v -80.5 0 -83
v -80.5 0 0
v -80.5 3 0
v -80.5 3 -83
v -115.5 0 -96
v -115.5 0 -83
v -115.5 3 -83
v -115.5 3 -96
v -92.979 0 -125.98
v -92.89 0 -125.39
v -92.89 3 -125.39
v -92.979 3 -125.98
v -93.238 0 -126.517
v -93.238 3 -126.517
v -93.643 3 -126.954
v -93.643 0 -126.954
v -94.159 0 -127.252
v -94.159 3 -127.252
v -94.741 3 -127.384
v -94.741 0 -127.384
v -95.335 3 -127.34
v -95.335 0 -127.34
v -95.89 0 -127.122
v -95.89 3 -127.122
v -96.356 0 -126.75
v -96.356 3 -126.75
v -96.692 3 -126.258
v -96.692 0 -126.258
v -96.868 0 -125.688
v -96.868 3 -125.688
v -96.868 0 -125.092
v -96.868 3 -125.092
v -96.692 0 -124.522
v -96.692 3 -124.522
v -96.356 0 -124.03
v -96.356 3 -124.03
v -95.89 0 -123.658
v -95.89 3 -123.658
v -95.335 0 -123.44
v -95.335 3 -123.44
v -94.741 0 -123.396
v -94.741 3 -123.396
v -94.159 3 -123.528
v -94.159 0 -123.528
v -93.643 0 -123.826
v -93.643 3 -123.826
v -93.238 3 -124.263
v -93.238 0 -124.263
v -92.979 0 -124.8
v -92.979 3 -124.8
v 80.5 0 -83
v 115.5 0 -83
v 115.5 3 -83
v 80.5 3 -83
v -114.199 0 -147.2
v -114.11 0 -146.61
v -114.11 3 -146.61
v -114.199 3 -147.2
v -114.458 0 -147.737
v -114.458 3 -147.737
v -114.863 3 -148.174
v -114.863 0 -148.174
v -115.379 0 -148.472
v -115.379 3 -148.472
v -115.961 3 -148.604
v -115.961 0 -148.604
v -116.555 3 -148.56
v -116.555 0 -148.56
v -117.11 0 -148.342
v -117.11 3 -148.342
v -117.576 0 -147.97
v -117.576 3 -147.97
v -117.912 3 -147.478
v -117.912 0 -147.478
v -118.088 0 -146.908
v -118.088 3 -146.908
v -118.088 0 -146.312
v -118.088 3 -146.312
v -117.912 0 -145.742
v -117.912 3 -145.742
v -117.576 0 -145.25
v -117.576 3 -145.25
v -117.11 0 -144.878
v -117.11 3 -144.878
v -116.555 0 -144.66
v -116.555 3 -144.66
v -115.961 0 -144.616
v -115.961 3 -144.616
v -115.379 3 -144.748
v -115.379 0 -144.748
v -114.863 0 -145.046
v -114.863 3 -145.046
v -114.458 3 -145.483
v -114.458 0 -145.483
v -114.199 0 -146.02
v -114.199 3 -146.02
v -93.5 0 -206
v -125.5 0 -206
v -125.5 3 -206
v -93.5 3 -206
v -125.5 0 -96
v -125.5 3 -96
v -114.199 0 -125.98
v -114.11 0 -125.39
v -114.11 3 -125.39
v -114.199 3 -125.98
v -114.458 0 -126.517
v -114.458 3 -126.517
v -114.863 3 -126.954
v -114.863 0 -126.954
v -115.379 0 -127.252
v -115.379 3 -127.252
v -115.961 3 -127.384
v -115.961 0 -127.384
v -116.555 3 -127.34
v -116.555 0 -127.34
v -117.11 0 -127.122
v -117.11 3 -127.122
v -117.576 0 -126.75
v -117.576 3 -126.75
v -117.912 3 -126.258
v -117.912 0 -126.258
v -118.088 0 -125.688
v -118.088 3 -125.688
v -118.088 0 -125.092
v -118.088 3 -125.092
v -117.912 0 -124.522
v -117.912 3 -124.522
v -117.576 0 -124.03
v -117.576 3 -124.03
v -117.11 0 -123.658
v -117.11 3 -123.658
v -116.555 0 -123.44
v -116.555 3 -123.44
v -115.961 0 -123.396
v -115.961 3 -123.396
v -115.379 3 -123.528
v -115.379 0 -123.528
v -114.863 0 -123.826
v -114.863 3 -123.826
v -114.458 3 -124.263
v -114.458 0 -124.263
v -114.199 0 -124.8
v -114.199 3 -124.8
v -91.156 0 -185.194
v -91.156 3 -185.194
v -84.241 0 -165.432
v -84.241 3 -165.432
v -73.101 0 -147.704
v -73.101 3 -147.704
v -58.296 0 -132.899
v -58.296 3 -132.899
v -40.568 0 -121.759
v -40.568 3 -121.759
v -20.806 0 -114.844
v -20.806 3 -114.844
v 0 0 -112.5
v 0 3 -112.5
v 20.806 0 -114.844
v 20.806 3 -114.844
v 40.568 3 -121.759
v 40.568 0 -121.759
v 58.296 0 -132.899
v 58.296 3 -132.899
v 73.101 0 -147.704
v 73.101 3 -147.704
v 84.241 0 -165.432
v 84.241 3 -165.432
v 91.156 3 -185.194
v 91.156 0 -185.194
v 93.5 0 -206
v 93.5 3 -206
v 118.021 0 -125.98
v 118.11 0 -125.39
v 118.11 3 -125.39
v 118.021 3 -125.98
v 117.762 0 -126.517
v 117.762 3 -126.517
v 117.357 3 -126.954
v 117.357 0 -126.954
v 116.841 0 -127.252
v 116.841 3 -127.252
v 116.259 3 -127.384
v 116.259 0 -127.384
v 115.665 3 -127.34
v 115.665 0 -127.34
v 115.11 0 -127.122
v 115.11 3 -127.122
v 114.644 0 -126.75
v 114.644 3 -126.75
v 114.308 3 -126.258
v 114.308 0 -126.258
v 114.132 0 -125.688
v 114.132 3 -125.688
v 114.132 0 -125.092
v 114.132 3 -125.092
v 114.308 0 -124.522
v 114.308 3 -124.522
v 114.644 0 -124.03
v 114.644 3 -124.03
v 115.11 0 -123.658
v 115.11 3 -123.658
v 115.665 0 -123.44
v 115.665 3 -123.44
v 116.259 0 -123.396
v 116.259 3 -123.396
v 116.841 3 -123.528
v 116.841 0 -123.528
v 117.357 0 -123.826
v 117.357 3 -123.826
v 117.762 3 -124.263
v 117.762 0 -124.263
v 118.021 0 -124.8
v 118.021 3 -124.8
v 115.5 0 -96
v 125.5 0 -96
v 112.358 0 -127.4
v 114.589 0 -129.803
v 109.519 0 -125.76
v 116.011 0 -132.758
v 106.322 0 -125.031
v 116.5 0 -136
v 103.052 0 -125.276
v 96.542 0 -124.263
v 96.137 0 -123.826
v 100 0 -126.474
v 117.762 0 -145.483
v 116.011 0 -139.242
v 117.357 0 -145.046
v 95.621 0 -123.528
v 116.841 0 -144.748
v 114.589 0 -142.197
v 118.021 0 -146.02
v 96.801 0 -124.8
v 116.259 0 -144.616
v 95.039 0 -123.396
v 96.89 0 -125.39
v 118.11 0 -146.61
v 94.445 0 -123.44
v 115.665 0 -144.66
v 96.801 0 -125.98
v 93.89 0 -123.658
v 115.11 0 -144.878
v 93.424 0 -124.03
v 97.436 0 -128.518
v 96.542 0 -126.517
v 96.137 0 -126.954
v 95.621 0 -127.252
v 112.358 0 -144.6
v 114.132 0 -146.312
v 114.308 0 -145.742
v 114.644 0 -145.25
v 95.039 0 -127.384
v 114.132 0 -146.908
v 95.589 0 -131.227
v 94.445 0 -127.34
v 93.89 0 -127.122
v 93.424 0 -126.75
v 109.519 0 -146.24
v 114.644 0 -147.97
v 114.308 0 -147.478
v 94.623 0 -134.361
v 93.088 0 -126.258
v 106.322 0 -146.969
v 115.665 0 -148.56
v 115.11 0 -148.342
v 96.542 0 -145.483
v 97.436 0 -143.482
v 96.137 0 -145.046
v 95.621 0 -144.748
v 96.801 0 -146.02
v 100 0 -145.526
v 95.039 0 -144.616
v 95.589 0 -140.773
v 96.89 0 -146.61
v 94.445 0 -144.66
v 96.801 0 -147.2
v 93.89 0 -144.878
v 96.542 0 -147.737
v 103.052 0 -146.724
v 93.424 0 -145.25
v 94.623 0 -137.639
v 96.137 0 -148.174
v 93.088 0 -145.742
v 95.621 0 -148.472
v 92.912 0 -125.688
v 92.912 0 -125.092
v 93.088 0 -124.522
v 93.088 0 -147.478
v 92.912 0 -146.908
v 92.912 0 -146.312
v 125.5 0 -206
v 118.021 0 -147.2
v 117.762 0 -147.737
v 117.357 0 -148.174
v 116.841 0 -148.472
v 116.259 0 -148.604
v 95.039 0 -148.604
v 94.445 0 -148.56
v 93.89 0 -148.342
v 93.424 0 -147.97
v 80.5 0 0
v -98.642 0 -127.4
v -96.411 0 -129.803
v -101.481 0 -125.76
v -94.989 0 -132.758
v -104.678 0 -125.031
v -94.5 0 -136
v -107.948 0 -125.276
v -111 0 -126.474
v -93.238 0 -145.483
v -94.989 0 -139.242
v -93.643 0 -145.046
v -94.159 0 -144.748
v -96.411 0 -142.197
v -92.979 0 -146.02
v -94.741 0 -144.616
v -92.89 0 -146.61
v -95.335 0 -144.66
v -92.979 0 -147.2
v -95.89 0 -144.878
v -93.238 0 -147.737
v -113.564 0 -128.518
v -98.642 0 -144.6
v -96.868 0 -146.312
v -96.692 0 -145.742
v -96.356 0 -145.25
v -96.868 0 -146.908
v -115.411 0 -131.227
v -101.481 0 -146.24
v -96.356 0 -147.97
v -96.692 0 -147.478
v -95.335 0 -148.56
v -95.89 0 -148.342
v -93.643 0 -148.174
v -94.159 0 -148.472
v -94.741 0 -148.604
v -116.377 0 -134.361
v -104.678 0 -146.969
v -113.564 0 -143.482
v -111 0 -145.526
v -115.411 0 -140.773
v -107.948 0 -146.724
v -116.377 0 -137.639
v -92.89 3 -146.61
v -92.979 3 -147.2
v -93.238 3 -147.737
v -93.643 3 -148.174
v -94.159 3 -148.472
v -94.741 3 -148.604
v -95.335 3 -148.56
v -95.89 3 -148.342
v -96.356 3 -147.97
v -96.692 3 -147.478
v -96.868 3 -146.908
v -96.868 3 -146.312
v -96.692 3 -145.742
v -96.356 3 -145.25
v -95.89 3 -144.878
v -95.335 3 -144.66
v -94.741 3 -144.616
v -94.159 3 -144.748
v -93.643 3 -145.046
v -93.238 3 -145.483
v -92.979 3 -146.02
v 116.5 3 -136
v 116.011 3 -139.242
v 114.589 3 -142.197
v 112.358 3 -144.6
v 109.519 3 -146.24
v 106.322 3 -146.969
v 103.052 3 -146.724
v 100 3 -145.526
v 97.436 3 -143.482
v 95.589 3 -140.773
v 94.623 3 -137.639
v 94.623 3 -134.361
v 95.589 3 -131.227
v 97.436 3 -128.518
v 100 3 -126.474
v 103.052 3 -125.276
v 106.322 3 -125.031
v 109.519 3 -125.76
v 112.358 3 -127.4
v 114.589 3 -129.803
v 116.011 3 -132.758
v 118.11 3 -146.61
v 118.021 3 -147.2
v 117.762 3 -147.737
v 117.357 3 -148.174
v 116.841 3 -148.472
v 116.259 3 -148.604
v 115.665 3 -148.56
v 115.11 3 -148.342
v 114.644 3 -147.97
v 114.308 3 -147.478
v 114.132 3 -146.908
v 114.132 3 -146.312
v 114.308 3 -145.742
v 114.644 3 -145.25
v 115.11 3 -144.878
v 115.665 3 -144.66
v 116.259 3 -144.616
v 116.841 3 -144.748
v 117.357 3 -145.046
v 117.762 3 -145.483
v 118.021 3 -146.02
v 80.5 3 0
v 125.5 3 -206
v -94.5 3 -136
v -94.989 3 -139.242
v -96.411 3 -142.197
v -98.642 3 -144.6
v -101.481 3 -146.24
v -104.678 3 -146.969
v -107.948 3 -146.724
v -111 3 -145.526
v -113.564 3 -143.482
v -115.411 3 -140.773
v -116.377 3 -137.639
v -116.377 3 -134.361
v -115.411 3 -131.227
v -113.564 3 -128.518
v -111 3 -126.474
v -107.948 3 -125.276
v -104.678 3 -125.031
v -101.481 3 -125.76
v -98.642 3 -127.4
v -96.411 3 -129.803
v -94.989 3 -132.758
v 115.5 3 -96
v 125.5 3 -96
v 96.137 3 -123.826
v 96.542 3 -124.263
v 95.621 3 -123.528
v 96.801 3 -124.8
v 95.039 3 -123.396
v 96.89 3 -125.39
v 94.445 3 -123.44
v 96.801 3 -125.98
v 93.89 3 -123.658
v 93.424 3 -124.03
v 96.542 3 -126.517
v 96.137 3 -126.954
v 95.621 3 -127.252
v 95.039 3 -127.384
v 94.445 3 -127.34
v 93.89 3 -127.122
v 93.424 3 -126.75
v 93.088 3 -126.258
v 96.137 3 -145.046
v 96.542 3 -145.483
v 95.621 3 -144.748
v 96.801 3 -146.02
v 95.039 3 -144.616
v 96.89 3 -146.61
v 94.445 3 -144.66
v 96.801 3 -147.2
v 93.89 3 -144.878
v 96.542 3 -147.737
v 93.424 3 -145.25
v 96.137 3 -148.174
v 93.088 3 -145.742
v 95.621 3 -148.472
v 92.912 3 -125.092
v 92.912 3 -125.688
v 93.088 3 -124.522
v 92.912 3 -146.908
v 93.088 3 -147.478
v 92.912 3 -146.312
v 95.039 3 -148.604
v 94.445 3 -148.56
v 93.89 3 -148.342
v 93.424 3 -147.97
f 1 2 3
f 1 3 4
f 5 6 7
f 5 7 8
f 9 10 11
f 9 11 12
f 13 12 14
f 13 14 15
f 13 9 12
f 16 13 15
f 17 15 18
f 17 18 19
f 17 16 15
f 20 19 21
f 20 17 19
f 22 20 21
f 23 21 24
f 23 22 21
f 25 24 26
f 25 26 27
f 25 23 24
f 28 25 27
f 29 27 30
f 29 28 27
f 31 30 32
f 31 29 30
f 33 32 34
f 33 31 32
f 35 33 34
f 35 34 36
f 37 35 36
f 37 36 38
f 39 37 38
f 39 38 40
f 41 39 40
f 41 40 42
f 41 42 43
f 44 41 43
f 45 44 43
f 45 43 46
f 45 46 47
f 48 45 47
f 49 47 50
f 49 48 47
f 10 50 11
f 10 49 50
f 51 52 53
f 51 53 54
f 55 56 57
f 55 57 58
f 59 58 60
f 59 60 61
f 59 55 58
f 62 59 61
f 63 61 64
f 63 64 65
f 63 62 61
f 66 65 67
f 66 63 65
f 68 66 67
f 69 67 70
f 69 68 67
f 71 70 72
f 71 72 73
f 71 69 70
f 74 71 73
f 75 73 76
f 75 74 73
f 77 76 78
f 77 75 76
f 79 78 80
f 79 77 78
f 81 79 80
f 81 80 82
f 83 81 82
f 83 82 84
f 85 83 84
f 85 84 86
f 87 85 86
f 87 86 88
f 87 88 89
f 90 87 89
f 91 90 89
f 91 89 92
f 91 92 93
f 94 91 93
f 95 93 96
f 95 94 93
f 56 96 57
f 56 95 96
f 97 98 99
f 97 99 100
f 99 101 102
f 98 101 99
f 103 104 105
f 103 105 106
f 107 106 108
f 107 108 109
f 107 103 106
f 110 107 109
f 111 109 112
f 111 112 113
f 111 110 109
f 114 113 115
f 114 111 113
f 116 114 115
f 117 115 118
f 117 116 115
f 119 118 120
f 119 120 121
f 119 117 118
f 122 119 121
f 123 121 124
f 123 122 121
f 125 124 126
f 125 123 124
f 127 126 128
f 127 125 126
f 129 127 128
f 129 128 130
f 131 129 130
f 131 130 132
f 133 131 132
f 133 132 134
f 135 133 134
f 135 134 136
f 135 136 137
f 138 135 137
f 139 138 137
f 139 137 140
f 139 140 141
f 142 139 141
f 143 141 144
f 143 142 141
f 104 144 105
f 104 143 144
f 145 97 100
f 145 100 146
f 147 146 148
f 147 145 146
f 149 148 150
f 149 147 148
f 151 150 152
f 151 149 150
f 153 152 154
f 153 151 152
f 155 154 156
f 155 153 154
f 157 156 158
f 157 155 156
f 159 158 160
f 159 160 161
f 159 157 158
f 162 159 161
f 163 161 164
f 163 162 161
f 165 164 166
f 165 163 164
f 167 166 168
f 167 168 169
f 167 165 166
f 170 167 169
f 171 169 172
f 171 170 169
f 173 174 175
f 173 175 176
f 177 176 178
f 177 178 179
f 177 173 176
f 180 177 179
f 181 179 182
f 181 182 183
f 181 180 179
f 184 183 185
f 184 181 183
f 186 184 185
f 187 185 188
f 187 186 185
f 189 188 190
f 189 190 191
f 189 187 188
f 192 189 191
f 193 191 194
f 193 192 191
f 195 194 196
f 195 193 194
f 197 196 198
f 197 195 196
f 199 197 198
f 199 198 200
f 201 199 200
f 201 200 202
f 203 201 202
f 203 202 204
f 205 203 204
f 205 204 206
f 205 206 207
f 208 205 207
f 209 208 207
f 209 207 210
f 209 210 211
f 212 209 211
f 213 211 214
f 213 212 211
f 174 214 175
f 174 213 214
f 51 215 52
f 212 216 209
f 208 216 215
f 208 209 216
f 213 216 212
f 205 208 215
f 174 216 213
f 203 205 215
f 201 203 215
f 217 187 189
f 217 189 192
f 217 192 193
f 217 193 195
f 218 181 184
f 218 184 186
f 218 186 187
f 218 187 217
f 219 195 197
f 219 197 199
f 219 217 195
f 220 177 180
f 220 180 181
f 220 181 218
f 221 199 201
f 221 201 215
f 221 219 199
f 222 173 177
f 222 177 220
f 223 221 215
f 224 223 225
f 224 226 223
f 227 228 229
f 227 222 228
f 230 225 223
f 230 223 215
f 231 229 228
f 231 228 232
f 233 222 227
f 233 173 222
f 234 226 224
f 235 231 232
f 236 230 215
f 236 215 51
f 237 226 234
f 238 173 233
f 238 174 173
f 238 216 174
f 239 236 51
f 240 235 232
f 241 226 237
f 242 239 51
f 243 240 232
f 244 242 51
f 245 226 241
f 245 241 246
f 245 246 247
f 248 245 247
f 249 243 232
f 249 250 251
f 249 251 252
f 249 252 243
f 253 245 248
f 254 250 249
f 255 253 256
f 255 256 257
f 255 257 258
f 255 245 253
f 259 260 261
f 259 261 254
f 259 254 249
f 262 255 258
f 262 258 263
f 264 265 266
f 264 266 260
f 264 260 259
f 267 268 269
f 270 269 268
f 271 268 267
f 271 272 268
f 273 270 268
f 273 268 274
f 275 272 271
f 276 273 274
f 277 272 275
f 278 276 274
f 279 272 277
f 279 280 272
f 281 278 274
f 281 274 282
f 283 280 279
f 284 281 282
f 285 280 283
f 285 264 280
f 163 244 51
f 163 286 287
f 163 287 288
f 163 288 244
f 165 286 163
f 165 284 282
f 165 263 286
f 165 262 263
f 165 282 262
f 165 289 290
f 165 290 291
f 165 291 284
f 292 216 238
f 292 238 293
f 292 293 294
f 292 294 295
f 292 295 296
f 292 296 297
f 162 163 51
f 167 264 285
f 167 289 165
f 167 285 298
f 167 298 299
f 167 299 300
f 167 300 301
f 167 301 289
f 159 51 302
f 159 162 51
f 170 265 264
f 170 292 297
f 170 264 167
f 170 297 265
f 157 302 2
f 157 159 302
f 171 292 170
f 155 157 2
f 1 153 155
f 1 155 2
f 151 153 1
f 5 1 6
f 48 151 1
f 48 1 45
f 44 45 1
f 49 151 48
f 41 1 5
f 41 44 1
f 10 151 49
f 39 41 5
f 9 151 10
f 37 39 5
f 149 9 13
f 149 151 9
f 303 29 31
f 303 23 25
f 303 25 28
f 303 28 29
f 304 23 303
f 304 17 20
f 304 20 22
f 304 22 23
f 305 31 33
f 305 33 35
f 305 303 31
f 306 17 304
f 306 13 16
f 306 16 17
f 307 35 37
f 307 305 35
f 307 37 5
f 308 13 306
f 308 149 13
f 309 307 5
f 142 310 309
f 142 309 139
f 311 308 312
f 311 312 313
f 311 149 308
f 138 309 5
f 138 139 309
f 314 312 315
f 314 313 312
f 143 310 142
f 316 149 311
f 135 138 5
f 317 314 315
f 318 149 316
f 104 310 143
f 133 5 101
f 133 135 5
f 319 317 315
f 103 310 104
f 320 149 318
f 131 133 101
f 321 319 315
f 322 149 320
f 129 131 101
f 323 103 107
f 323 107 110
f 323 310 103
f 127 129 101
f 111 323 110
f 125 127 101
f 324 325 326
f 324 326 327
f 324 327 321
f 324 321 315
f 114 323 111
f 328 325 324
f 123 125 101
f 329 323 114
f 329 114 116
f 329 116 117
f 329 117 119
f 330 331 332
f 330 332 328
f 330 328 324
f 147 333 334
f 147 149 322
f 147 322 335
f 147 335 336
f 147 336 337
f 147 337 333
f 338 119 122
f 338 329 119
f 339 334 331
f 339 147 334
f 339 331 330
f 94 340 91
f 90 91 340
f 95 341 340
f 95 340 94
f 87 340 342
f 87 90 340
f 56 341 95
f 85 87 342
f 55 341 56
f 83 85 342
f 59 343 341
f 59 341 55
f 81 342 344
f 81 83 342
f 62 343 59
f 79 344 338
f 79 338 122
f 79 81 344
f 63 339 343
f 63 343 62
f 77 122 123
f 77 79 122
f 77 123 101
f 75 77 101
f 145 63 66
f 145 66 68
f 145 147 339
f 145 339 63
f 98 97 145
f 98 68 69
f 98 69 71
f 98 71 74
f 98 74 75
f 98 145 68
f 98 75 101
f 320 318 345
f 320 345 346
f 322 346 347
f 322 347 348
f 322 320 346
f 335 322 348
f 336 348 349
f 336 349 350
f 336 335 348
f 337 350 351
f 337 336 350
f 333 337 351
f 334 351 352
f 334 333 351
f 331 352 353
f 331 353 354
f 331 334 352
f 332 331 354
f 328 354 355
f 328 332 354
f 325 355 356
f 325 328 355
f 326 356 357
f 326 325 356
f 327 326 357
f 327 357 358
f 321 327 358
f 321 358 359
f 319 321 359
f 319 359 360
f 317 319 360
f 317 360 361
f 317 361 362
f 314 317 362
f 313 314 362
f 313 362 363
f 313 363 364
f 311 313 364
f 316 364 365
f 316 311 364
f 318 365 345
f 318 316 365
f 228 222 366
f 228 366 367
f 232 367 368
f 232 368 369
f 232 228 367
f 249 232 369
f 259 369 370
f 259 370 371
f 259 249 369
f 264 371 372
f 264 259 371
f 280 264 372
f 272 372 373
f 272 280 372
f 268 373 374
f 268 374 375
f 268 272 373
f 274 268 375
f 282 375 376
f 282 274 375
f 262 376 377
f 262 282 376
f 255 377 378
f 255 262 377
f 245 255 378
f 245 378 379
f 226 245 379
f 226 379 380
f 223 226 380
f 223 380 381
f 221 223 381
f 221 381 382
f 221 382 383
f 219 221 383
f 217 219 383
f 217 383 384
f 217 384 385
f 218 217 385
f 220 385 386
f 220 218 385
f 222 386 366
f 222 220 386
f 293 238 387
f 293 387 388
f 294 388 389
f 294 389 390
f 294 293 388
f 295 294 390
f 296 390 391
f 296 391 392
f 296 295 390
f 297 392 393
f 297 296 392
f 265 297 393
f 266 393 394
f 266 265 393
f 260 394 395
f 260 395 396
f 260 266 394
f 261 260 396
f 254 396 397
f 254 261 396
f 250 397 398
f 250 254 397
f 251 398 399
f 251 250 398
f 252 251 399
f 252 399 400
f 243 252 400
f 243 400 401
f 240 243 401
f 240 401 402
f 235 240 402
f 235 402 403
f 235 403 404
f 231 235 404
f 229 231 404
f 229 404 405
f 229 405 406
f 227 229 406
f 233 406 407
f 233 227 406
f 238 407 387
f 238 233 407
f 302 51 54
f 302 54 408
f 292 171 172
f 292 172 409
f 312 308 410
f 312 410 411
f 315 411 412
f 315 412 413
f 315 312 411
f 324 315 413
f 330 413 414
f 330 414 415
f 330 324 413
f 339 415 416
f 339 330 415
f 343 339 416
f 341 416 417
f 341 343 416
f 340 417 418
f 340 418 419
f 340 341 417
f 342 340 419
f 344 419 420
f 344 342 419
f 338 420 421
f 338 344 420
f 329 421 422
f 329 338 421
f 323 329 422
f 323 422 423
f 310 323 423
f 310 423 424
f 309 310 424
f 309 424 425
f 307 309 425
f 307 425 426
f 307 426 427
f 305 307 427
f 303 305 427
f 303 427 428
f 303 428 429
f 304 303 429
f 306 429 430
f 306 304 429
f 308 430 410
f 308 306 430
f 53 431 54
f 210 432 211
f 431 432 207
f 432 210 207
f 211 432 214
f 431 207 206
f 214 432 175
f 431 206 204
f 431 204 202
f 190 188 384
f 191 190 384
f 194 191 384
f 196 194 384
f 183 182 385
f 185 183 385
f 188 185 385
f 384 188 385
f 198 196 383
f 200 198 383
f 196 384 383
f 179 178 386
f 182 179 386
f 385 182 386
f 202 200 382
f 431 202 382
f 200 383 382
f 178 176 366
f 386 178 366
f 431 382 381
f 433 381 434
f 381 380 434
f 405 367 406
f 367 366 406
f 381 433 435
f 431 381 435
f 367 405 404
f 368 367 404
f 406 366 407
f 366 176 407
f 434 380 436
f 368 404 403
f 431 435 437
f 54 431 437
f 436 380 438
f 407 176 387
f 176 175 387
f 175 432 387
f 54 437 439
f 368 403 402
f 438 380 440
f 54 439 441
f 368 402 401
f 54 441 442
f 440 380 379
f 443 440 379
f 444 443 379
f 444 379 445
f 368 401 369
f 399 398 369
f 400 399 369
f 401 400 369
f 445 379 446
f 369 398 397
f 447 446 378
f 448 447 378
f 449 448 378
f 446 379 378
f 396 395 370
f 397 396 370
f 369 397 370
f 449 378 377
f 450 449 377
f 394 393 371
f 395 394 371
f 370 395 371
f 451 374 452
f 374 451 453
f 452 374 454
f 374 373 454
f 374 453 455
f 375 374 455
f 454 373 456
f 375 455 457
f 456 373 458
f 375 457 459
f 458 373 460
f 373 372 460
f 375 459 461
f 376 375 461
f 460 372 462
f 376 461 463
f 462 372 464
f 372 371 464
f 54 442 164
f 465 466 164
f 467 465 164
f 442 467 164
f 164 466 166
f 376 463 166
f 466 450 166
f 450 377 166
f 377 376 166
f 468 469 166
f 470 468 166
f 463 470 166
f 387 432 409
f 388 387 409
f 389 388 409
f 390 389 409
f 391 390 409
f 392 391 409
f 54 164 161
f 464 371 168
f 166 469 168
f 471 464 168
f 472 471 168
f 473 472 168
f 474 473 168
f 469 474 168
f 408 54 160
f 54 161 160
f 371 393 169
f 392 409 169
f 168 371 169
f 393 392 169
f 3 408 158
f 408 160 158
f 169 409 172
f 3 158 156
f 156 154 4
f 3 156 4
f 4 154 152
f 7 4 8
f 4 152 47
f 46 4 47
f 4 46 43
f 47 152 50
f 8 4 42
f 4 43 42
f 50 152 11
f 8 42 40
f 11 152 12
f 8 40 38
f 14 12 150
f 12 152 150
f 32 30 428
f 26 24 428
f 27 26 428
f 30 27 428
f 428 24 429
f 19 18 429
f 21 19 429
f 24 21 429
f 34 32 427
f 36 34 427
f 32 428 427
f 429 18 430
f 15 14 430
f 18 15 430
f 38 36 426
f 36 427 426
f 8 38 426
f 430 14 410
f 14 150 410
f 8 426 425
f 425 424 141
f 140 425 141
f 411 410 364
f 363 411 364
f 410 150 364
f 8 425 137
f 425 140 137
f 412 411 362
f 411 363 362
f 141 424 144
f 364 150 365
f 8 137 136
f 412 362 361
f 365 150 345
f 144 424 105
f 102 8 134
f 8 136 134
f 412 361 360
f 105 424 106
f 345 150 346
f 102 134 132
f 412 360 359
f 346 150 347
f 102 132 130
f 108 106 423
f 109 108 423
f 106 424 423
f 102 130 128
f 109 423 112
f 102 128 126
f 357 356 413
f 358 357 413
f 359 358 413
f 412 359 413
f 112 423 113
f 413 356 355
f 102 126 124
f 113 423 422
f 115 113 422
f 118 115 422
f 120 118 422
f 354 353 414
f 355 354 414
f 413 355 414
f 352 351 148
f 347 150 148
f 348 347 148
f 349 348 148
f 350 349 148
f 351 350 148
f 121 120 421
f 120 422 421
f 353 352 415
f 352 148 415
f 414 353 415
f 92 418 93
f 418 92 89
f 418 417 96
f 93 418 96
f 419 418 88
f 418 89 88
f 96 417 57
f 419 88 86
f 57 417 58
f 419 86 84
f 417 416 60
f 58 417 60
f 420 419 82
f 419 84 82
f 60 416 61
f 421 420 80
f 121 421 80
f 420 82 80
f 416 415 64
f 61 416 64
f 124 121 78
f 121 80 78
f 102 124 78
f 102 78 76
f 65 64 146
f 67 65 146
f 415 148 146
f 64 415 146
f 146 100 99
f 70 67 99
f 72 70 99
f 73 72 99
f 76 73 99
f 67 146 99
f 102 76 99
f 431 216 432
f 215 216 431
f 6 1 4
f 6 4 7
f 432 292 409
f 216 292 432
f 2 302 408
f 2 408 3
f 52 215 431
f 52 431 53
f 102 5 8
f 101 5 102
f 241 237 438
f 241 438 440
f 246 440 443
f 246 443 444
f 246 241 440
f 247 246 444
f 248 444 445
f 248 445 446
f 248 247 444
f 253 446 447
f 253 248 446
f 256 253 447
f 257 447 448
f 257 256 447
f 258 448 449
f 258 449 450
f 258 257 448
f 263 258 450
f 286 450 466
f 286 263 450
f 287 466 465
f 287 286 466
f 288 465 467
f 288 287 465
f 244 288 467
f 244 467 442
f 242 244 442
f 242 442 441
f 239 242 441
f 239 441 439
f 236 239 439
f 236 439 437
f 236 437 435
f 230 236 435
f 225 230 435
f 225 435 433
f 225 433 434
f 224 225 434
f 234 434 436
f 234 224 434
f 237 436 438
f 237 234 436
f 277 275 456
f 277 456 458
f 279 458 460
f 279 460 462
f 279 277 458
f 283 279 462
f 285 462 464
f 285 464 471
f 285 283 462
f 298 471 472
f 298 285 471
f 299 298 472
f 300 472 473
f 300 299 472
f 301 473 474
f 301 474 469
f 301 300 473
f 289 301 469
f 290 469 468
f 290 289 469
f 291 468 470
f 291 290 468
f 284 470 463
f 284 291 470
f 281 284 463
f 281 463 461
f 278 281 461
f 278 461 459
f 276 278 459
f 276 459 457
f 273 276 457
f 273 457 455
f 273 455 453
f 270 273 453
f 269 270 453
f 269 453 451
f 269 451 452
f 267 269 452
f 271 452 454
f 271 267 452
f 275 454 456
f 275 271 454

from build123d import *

# Parameters (mm, degrees)
ESQUISSE1_R      = 2
ESQUISSE1_R_2    = 11
EXTRUSION1_DEPTH = 3


with BuildPart() as part:
    # Esquisse1 → Extrusion1 (new body)
    with BuildSketch(Plane(origin=(0, 0, 0), x_dir=(1, 0, 0), z_dir=(0, 1, 0))):
        with BuildLine():
            Line((80.5, 0), (-80.5, 0))
            Line((-80.5, 0), (-80.5, 83))
            Line((-80.5, 83), (-115.5, 83))
            Line((-115.5, 83), (-115.5, 96))
            Line((-115.5, 96), (-125.5, 96))
            Line((-125.5, 96), (-125.5, 206))
            Line((-125.5, 206), (-93.5, 206))
            ThreePointArc((-93.5, 206), (0, 112.5), (93.5, 206))
            Line((93.5, 206), (125.5, 206))
            Line((125.5, 206), (125.5, 96))
            Line((125.5, 96), (115.5, 96))
            Line((115.5, 96), (115.5, 83))
            Line((115.5, 83), (80.5, 83))
            Line((80.5, 83), (80.5, 0))
        make_face()
        with Locations((94.89, 146.61)):
            Circle(ESQUISSE1_R, mode=Mode.SUBTRACT)
        with Locations((-105.5, 136)):
            Circle(ESQUISSE1_R_2, mode=Mode.SUBTRACT)
        with Locations((-116.11, 146.61)):
            Circle(ESQUISSE1_R, mode=Mode.SUBTRACT)
        with Locations((-116.11, 125.39)):
            Circle(ESQUISSE1_R, mode=Mode.SUBTRACT)
        with Locations((-94.89, 125.39)):
            Circle(ESQUISSE1_R, mode=Mode.SUBTRACT)
        with Locations((-94.89, 146.61)):
            Circle(ESQUISSE1_R, mode=Mode.SUBTRACT)
        with Locations((94.89, 125.39)):
            Circle(ESQUISSE1_R, mode=Mode.SUBTRACT)
        with Locations((116.11, 125.39)):
            Circle(ESQUISSE1_R, mode=Mode.SUBTRACT)
        with Locations((116.11, 146.61)):
            Circle(ESQUISSE1_R, mode=Mode.SUBTRACT)
        with Locations((105.5, 136)):
            Circle(ESQUISSE1_R_2, mode=Mode.SUBTRACT)
    extrude(amount=EXTRUSION1_DEPTH)


solid = part.part
